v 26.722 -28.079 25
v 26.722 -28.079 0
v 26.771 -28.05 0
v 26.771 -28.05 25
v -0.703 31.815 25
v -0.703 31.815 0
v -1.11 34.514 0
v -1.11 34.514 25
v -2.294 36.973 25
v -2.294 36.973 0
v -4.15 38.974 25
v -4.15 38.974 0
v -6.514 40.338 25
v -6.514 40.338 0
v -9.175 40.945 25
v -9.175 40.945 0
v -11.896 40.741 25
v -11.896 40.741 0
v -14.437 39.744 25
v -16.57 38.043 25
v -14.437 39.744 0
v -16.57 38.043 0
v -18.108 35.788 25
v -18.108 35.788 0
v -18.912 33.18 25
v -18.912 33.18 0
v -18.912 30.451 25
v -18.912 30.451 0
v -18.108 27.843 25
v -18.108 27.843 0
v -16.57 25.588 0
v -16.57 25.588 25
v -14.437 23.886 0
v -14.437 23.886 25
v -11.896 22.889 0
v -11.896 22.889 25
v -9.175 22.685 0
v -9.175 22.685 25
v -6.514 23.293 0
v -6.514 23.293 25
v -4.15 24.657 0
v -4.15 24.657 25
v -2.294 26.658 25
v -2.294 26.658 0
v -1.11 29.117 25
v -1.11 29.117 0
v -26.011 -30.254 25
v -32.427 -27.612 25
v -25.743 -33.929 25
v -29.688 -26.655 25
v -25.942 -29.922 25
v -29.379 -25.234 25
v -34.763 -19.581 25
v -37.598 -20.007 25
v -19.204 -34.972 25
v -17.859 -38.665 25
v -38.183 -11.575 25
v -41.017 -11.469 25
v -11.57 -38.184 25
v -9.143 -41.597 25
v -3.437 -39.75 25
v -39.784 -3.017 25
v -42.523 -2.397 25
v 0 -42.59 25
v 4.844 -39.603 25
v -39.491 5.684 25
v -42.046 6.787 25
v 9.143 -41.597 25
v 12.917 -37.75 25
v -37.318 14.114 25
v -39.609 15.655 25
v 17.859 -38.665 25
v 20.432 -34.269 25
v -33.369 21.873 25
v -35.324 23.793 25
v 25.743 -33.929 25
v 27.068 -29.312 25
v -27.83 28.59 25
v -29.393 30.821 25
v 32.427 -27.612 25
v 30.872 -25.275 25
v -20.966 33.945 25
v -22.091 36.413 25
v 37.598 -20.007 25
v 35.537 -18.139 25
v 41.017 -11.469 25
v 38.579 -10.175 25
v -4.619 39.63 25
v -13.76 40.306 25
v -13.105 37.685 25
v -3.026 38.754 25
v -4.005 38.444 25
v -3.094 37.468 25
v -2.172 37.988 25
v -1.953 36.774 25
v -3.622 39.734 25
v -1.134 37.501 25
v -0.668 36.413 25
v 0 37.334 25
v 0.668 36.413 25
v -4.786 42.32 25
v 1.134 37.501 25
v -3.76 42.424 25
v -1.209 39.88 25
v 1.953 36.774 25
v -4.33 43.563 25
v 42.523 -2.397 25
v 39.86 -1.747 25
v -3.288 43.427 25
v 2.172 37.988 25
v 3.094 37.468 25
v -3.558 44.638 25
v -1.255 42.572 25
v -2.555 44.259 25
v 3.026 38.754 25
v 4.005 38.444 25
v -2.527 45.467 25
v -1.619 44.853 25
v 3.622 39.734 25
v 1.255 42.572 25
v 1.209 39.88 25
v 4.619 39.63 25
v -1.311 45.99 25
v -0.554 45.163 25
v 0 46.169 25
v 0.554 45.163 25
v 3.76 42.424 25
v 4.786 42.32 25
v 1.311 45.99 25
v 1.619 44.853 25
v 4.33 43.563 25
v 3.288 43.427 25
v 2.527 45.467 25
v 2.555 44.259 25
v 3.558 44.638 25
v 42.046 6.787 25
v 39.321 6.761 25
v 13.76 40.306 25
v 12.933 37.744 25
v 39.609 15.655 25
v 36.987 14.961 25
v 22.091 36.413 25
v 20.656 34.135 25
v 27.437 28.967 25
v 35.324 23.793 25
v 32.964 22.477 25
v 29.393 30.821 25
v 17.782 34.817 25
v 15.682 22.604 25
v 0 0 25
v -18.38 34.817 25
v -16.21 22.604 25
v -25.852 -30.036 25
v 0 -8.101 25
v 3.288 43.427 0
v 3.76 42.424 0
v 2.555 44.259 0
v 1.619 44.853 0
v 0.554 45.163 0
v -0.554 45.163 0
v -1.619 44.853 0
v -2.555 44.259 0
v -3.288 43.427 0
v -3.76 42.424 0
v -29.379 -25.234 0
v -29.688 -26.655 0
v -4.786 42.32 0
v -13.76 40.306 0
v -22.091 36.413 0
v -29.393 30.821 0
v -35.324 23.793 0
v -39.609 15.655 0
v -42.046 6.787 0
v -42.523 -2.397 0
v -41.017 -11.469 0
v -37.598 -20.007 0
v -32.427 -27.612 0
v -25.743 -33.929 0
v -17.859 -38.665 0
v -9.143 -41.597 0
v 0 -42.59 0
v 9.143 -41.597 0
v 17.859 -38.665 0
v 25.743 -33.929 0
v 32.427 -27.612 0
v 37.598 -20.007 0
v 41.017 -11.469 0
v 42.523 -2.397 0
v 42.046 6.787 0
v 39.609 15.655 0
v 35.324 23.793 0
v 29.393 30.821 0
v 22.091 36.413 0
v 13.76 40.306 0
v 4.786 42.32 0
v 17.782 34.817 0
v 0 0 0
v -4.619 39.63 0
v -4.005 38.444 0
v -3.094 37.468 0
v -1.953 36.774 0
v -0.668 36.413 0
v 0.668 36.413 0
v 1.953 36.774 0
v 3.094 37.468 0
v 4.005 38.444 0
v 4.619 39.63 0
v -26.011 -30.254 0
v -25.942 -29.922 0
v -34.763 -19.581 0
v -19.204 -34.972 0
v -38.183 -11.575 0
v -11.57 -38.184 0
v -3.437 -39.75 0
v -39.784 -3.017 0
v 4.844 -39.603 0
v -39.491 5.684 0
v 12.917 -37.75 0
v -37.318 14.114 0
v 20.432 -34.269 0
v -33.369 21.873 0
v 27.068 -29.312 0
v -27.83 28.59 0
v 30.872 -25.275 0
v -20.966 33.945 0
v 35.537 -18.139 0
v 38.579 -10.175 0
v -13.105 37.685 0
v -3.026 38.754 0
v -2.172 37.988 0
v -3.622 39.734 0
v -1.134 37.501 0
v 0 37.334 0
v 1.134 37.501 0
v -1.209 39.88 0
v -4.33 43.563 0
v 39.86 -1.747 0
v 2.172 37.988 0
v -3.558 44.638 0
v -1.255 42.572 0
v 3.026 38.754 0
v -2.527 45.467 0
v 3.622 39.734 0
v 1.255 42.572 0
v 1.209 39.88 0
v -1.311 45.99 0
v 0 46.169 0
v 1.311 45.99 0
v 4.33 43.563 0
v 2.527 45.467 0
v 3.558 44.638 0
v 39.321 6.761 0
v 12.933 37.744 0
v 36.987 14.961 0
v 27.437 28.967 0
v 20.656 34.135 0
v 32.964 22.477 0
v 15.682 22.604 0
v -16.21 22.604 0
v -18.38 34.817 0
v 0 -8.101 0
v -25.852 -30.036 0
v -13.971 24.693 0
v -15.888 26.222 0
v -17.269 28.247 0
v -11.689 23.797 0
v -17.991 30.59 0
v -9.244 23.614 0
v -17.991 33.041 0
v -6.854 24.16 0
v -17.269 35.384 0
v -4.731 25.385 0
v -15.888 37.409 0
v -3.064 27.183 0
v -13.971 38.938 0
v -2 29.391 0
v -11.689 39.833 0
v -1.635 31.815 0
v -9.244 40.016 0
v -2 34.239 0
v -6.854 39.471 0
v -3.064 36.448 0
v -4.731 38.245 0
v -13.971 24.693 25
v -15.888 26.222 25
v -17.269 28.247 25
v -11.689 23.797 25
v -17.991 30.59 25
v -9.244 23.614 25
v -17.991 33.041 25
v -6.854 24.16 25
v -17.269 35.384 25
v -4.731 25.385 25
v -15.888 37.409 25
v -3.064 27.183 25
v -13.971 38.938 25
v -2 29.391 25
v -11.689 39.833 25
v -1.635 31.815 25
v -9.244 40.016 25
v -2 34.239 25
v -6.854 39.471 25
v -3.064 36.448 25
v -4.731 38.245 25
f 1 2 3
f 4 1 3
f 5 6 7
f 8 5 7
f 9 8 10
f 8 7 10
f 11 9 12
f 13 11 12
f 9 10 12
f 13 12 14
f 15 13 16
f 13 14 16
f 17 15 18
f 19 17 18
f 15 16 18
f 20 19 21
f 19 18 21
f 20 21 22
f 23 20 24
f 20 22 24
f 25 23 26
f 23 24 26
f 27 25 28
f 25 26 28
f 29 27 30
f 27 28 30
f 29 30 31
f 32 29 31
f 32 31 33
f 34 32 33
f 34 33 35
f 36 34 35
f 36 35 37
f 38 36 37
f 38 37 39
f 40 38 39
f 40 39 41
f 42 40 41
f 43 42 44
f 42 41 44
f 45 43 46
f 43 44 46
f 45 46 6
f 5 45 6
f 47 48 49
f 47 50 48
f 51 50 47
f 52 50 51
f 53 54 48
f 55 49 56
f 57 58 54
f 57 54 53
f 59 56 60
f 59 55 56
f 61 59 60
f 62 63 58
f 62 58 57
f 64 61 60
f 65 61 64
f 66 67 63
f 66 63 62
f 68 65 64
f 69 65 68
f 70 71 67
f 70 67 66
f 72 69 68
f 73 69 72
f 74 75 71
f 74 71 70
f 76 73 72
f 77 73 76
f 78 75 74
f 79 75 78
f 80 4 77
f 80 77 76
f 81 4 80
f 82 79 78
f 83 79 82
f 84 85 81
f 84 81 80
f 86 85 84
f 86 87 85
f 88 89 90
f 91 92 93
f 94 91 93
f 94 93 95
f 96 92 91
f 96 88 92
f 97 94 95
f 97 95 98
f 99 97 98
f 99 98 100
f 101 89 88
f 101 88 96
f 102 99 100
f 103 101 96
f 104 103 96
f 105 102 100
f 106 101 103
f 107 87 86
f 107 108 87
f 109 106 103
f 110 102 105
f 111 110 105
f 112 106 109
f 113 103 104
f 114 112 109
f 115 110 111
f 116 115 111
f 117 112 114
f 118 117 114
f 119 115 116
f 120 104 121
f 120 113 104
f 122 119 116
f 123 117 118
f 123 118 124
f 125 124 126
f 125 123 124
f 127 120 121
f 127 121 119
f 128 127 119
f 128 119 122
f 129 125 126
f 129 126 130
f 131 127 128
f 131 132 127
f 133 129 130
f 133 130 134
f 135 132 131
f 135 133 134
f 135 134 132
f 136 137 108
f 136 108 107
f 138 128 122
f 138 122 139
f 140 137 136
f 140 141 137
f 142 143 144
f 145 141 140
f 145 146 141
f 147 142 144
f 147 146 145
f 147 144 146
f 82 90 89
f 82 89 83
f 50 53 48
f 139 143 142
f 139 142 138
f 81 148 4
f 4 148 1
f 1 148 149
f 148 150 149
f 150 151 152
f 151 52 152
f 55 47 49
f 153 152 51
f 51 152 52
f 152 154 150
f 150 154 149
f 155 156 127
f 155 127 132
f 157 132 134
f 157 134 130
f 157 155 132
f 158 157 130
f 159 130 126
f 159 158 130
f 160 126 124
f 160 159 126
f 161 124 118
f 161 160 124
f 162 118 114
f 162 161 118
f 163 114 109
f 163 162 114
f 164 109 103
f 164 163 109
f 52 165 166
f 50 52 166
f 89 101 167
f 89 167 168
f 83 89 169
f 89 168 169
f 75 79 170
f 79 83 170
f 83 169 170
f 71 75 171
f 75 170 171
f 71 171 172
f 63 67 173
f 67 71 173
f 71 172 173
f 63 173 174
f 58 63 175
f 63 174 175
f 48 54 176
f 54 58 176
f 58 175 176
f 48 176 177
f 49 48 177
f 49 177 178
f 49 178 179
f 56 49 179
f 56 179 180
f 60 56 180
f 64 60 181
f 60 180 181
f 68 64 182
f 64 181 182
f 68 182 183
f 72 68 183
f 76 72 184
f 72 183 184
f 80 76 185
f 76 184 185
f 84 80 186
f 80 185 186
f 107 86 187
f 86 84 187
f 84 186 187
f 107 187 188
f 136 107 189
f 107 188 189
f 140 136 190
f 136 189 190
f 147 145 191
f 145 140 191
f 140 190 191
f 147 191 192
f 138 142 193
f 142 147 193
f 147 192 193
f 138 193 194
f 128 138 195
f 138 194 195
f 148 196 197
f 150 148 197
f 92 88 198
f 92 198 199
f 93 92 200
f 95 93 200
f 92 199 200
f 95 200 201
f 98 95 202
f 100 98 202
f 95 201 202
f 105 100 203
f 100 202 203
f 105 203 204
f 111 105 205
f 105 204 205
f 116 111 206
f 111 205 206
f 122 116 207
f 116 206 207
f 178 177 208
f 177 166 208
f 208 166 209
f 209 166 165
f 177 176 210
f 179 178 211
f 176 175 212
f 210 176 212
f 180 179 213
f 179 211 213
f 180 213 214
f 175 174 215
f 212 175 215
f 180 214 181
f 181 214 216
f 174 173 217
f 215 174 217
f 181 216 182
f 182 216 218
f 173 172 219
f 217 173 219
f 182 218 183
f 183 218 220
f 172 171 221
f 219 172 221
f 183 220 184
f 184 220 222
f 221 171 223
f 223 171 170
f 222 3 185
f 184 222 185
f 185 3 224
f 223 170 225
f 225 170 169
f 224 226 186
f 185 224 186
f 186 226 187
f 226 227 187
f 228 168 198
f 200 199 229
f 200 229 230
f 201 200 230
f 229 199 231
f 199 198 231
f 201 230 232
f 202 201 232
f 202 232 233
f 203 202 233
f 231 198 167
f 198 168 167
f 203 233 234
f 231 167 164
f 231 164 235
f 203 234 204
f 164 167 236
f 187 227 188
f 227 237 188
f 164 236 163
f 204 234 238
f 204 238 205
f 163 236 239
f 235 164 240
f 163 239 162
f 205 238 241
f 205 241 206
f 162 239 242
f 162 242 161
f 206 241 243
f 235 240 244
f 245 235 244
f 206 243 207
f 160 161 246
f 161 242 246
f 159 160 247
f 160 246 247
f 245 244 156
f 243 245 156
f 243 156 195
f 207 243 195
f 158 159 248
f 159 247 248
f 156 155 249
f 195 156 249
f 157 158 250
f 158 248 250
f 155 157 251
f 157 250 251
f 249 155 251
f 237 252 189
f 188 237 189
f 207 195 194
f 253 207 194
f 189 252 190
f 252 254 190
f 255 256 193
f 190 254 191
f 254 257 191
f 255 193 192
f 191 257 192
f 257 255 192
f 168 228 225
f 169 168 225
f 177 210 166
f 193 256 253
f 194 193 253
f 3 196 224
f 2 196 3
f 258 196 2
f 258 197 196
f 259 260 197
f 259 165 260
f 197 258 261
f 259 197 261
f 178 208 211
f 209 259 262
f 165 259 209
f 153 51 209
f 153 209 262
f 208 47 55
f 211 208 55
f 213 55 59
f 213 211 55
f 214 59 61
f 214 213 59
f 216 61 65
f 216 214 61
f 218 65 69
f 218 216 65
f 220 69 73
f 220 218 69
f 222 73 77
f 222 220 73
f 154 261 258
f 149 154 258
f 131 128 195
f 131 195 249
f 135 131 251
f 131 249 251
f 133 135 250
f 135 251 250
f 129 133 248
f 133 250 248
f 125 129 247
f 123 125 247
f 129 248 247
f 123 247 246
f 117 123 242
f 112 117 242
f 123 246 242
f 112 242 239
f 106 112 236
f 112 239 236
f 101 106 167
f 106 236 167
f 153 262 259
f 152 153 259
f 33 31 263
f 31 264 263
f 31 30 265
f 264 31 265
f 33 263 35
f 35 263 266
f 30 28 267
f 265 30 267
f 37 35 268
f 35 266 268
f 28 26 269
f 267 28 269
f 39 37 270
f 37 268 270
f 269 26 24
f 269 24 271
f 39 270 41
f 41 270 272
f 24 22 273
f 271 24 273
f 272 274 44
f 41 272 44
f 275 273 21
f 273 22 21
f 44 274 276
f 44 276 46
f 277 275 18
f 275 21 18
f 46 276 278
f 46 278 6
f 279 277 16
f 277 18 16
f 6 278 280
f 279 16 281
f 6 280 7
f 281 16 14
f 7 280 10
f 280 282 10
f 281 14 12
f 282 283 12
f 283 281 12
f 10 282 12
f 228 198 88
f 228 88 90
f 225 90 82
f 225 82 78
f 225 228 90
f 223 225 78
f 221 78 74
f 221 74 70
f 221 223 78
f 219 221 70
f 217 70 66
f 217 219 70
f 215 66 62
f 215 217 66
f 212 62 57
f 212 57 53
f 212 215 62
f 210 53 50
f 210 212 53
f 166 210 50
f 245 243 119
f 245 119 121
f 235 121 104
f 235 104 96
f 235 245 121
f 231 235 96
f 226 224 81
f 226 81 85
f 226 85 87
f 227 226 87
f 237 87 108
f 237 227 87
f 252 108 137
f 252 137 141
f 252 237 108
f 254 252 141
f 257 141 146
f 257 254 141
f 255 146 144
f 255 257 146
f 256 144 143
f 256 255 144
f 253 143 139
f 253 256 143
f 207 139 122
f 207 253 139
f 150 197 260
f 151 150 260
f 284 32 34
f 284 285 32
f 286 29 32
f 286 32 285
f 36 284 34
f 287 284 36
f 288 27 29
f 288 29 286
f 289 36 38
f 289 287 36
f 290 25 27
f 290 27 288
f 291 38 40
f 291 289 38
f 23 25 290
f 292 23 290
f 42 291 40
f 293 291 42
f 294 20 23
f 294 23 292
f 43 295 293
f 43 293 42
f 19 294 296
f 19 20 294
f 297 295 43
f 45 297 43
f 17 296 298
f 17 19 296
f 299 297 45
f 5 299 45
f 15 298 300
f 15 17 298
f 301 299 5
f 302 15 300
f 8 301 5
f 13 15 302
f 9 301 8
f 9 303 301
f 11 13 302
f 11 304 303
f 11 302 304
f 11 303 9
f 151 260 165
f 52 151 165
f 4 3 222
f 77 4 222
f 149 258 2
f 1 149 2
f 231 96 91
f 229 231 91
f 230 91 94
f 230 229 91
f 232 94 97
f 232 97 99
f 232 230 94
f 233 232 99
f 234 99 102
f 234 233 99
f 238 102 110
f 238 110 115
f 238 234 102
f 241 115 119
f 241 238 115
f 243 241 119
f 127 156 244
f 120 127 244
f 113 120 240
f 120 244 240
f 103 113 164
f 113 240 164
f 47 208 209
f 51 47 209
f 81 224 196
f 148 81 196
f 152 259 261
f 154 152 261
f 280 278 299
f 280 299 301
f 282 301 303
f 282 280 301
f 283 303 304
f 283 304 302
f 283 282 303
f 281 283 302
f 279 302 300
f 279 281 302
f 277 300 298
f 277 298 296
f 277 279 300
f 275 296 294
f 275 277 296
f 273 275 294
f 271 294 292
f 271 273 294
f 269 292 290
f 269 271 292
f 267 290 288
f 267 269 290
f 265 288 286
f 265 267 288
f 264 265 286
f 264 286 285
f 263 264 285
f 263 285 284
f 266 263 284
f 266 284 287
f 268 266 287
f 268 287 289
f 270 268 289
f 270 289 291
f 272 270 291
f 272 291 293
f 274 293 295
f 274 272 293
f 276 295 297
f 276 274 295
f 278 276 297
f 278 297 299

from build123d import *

# Parameters (mm, degrees)
F0_R      = 42.5901202059
F0_R_2    = 39.8982916651
F1_DEPTH  = 25
F3_DEPTH  = 25
F5_DEPTH  = 25
F7_DEPTH  = 25
F8_R      = 4.9005997311
F8_R_2    = 3.9339377278
F9_DEPTH  = 25
F10_R     = 9.1556057754
F10_R_2   = 8.2241228005
F12_DEPTH = 25


# Not quite as in the source:
# - the program builds the solid bodies; features that only make, move or delete a surface that nothing else refers to are left out


with BuildPart() as f1:
    # F0 (on Top) → F1 (new body)
    with BuildSketch(Plane.XY):
        Circle(F0_R)
        Circle(F0_R_2, mode=Mode.SUBTRACT)
    extrude(amount=F1_DEPTH)

    # F2 (on Top) → F3 (join)
    with BuildSketch(Plane.XY):
        Polygon((-18.3799806982, 34.8173640668), (-29.4378567487, -25.5526583642), (-25.8515197784, -30.0355795771), (-16.209538835, 22.6044213756), (0, -8.1014549928), (15.6823994675, 22.6044213756), (26.7224249176, -28.0793387221), (30.932161957, -25.5526583642), (17.7822578698, 34.8173640668), (0, 0), align=None)
    extrude(amount=F3_DEPTH)

    # F4 (on Top) → F5 (join)
    with BuildSketch(Plane.XY):
        Polygon((-25.5759004503, -28.1734243035), (-29.1299819946, -24.0862295032), (-30.0185028464, -28.1734243035), (-26.3755694032, -31.9940634072), align=None)
    extrude(amount=F5_DEPTH)

    # F6 (on Top) → F7 (join)
    with BuildSketch(Plane.XY):
        Polygon((29.9566332251, -24.3527851999), (26.4025498182, -26.485234499), (27.4687726051, -31.0166906565), (30.9340041131, -26.3075307012), align=None)
    extrude(amount=F7_DEPTH)

    # F8 (on Top) → F9 (join)
    with BuildSketch(Plane.XY):
        with Locations((0, 41.2680134177)):
            Circle(F8_R)
        with Locations((0, 41.2680134177)):
            Circle(F8_R_2, mode=Mode.SUBTRACT)
    extrude(amount=F9_DEPTH)


with BuildPart() as f12:
    # F10 (on Top) → F12 (new body)
    with BuildSketch(Plane.XY):
        with Locations((-9.8588764668, 31.8153724074)):
            Circle(F10_R)
        with Locations((-9.8588764668, 31.8153724074)):
            Circle(F10_R_2, mode=Mode.SUBTRACT)
    extrude(amount=F12_DEPTH)


solid = Compound([f1.part, f12.part])
